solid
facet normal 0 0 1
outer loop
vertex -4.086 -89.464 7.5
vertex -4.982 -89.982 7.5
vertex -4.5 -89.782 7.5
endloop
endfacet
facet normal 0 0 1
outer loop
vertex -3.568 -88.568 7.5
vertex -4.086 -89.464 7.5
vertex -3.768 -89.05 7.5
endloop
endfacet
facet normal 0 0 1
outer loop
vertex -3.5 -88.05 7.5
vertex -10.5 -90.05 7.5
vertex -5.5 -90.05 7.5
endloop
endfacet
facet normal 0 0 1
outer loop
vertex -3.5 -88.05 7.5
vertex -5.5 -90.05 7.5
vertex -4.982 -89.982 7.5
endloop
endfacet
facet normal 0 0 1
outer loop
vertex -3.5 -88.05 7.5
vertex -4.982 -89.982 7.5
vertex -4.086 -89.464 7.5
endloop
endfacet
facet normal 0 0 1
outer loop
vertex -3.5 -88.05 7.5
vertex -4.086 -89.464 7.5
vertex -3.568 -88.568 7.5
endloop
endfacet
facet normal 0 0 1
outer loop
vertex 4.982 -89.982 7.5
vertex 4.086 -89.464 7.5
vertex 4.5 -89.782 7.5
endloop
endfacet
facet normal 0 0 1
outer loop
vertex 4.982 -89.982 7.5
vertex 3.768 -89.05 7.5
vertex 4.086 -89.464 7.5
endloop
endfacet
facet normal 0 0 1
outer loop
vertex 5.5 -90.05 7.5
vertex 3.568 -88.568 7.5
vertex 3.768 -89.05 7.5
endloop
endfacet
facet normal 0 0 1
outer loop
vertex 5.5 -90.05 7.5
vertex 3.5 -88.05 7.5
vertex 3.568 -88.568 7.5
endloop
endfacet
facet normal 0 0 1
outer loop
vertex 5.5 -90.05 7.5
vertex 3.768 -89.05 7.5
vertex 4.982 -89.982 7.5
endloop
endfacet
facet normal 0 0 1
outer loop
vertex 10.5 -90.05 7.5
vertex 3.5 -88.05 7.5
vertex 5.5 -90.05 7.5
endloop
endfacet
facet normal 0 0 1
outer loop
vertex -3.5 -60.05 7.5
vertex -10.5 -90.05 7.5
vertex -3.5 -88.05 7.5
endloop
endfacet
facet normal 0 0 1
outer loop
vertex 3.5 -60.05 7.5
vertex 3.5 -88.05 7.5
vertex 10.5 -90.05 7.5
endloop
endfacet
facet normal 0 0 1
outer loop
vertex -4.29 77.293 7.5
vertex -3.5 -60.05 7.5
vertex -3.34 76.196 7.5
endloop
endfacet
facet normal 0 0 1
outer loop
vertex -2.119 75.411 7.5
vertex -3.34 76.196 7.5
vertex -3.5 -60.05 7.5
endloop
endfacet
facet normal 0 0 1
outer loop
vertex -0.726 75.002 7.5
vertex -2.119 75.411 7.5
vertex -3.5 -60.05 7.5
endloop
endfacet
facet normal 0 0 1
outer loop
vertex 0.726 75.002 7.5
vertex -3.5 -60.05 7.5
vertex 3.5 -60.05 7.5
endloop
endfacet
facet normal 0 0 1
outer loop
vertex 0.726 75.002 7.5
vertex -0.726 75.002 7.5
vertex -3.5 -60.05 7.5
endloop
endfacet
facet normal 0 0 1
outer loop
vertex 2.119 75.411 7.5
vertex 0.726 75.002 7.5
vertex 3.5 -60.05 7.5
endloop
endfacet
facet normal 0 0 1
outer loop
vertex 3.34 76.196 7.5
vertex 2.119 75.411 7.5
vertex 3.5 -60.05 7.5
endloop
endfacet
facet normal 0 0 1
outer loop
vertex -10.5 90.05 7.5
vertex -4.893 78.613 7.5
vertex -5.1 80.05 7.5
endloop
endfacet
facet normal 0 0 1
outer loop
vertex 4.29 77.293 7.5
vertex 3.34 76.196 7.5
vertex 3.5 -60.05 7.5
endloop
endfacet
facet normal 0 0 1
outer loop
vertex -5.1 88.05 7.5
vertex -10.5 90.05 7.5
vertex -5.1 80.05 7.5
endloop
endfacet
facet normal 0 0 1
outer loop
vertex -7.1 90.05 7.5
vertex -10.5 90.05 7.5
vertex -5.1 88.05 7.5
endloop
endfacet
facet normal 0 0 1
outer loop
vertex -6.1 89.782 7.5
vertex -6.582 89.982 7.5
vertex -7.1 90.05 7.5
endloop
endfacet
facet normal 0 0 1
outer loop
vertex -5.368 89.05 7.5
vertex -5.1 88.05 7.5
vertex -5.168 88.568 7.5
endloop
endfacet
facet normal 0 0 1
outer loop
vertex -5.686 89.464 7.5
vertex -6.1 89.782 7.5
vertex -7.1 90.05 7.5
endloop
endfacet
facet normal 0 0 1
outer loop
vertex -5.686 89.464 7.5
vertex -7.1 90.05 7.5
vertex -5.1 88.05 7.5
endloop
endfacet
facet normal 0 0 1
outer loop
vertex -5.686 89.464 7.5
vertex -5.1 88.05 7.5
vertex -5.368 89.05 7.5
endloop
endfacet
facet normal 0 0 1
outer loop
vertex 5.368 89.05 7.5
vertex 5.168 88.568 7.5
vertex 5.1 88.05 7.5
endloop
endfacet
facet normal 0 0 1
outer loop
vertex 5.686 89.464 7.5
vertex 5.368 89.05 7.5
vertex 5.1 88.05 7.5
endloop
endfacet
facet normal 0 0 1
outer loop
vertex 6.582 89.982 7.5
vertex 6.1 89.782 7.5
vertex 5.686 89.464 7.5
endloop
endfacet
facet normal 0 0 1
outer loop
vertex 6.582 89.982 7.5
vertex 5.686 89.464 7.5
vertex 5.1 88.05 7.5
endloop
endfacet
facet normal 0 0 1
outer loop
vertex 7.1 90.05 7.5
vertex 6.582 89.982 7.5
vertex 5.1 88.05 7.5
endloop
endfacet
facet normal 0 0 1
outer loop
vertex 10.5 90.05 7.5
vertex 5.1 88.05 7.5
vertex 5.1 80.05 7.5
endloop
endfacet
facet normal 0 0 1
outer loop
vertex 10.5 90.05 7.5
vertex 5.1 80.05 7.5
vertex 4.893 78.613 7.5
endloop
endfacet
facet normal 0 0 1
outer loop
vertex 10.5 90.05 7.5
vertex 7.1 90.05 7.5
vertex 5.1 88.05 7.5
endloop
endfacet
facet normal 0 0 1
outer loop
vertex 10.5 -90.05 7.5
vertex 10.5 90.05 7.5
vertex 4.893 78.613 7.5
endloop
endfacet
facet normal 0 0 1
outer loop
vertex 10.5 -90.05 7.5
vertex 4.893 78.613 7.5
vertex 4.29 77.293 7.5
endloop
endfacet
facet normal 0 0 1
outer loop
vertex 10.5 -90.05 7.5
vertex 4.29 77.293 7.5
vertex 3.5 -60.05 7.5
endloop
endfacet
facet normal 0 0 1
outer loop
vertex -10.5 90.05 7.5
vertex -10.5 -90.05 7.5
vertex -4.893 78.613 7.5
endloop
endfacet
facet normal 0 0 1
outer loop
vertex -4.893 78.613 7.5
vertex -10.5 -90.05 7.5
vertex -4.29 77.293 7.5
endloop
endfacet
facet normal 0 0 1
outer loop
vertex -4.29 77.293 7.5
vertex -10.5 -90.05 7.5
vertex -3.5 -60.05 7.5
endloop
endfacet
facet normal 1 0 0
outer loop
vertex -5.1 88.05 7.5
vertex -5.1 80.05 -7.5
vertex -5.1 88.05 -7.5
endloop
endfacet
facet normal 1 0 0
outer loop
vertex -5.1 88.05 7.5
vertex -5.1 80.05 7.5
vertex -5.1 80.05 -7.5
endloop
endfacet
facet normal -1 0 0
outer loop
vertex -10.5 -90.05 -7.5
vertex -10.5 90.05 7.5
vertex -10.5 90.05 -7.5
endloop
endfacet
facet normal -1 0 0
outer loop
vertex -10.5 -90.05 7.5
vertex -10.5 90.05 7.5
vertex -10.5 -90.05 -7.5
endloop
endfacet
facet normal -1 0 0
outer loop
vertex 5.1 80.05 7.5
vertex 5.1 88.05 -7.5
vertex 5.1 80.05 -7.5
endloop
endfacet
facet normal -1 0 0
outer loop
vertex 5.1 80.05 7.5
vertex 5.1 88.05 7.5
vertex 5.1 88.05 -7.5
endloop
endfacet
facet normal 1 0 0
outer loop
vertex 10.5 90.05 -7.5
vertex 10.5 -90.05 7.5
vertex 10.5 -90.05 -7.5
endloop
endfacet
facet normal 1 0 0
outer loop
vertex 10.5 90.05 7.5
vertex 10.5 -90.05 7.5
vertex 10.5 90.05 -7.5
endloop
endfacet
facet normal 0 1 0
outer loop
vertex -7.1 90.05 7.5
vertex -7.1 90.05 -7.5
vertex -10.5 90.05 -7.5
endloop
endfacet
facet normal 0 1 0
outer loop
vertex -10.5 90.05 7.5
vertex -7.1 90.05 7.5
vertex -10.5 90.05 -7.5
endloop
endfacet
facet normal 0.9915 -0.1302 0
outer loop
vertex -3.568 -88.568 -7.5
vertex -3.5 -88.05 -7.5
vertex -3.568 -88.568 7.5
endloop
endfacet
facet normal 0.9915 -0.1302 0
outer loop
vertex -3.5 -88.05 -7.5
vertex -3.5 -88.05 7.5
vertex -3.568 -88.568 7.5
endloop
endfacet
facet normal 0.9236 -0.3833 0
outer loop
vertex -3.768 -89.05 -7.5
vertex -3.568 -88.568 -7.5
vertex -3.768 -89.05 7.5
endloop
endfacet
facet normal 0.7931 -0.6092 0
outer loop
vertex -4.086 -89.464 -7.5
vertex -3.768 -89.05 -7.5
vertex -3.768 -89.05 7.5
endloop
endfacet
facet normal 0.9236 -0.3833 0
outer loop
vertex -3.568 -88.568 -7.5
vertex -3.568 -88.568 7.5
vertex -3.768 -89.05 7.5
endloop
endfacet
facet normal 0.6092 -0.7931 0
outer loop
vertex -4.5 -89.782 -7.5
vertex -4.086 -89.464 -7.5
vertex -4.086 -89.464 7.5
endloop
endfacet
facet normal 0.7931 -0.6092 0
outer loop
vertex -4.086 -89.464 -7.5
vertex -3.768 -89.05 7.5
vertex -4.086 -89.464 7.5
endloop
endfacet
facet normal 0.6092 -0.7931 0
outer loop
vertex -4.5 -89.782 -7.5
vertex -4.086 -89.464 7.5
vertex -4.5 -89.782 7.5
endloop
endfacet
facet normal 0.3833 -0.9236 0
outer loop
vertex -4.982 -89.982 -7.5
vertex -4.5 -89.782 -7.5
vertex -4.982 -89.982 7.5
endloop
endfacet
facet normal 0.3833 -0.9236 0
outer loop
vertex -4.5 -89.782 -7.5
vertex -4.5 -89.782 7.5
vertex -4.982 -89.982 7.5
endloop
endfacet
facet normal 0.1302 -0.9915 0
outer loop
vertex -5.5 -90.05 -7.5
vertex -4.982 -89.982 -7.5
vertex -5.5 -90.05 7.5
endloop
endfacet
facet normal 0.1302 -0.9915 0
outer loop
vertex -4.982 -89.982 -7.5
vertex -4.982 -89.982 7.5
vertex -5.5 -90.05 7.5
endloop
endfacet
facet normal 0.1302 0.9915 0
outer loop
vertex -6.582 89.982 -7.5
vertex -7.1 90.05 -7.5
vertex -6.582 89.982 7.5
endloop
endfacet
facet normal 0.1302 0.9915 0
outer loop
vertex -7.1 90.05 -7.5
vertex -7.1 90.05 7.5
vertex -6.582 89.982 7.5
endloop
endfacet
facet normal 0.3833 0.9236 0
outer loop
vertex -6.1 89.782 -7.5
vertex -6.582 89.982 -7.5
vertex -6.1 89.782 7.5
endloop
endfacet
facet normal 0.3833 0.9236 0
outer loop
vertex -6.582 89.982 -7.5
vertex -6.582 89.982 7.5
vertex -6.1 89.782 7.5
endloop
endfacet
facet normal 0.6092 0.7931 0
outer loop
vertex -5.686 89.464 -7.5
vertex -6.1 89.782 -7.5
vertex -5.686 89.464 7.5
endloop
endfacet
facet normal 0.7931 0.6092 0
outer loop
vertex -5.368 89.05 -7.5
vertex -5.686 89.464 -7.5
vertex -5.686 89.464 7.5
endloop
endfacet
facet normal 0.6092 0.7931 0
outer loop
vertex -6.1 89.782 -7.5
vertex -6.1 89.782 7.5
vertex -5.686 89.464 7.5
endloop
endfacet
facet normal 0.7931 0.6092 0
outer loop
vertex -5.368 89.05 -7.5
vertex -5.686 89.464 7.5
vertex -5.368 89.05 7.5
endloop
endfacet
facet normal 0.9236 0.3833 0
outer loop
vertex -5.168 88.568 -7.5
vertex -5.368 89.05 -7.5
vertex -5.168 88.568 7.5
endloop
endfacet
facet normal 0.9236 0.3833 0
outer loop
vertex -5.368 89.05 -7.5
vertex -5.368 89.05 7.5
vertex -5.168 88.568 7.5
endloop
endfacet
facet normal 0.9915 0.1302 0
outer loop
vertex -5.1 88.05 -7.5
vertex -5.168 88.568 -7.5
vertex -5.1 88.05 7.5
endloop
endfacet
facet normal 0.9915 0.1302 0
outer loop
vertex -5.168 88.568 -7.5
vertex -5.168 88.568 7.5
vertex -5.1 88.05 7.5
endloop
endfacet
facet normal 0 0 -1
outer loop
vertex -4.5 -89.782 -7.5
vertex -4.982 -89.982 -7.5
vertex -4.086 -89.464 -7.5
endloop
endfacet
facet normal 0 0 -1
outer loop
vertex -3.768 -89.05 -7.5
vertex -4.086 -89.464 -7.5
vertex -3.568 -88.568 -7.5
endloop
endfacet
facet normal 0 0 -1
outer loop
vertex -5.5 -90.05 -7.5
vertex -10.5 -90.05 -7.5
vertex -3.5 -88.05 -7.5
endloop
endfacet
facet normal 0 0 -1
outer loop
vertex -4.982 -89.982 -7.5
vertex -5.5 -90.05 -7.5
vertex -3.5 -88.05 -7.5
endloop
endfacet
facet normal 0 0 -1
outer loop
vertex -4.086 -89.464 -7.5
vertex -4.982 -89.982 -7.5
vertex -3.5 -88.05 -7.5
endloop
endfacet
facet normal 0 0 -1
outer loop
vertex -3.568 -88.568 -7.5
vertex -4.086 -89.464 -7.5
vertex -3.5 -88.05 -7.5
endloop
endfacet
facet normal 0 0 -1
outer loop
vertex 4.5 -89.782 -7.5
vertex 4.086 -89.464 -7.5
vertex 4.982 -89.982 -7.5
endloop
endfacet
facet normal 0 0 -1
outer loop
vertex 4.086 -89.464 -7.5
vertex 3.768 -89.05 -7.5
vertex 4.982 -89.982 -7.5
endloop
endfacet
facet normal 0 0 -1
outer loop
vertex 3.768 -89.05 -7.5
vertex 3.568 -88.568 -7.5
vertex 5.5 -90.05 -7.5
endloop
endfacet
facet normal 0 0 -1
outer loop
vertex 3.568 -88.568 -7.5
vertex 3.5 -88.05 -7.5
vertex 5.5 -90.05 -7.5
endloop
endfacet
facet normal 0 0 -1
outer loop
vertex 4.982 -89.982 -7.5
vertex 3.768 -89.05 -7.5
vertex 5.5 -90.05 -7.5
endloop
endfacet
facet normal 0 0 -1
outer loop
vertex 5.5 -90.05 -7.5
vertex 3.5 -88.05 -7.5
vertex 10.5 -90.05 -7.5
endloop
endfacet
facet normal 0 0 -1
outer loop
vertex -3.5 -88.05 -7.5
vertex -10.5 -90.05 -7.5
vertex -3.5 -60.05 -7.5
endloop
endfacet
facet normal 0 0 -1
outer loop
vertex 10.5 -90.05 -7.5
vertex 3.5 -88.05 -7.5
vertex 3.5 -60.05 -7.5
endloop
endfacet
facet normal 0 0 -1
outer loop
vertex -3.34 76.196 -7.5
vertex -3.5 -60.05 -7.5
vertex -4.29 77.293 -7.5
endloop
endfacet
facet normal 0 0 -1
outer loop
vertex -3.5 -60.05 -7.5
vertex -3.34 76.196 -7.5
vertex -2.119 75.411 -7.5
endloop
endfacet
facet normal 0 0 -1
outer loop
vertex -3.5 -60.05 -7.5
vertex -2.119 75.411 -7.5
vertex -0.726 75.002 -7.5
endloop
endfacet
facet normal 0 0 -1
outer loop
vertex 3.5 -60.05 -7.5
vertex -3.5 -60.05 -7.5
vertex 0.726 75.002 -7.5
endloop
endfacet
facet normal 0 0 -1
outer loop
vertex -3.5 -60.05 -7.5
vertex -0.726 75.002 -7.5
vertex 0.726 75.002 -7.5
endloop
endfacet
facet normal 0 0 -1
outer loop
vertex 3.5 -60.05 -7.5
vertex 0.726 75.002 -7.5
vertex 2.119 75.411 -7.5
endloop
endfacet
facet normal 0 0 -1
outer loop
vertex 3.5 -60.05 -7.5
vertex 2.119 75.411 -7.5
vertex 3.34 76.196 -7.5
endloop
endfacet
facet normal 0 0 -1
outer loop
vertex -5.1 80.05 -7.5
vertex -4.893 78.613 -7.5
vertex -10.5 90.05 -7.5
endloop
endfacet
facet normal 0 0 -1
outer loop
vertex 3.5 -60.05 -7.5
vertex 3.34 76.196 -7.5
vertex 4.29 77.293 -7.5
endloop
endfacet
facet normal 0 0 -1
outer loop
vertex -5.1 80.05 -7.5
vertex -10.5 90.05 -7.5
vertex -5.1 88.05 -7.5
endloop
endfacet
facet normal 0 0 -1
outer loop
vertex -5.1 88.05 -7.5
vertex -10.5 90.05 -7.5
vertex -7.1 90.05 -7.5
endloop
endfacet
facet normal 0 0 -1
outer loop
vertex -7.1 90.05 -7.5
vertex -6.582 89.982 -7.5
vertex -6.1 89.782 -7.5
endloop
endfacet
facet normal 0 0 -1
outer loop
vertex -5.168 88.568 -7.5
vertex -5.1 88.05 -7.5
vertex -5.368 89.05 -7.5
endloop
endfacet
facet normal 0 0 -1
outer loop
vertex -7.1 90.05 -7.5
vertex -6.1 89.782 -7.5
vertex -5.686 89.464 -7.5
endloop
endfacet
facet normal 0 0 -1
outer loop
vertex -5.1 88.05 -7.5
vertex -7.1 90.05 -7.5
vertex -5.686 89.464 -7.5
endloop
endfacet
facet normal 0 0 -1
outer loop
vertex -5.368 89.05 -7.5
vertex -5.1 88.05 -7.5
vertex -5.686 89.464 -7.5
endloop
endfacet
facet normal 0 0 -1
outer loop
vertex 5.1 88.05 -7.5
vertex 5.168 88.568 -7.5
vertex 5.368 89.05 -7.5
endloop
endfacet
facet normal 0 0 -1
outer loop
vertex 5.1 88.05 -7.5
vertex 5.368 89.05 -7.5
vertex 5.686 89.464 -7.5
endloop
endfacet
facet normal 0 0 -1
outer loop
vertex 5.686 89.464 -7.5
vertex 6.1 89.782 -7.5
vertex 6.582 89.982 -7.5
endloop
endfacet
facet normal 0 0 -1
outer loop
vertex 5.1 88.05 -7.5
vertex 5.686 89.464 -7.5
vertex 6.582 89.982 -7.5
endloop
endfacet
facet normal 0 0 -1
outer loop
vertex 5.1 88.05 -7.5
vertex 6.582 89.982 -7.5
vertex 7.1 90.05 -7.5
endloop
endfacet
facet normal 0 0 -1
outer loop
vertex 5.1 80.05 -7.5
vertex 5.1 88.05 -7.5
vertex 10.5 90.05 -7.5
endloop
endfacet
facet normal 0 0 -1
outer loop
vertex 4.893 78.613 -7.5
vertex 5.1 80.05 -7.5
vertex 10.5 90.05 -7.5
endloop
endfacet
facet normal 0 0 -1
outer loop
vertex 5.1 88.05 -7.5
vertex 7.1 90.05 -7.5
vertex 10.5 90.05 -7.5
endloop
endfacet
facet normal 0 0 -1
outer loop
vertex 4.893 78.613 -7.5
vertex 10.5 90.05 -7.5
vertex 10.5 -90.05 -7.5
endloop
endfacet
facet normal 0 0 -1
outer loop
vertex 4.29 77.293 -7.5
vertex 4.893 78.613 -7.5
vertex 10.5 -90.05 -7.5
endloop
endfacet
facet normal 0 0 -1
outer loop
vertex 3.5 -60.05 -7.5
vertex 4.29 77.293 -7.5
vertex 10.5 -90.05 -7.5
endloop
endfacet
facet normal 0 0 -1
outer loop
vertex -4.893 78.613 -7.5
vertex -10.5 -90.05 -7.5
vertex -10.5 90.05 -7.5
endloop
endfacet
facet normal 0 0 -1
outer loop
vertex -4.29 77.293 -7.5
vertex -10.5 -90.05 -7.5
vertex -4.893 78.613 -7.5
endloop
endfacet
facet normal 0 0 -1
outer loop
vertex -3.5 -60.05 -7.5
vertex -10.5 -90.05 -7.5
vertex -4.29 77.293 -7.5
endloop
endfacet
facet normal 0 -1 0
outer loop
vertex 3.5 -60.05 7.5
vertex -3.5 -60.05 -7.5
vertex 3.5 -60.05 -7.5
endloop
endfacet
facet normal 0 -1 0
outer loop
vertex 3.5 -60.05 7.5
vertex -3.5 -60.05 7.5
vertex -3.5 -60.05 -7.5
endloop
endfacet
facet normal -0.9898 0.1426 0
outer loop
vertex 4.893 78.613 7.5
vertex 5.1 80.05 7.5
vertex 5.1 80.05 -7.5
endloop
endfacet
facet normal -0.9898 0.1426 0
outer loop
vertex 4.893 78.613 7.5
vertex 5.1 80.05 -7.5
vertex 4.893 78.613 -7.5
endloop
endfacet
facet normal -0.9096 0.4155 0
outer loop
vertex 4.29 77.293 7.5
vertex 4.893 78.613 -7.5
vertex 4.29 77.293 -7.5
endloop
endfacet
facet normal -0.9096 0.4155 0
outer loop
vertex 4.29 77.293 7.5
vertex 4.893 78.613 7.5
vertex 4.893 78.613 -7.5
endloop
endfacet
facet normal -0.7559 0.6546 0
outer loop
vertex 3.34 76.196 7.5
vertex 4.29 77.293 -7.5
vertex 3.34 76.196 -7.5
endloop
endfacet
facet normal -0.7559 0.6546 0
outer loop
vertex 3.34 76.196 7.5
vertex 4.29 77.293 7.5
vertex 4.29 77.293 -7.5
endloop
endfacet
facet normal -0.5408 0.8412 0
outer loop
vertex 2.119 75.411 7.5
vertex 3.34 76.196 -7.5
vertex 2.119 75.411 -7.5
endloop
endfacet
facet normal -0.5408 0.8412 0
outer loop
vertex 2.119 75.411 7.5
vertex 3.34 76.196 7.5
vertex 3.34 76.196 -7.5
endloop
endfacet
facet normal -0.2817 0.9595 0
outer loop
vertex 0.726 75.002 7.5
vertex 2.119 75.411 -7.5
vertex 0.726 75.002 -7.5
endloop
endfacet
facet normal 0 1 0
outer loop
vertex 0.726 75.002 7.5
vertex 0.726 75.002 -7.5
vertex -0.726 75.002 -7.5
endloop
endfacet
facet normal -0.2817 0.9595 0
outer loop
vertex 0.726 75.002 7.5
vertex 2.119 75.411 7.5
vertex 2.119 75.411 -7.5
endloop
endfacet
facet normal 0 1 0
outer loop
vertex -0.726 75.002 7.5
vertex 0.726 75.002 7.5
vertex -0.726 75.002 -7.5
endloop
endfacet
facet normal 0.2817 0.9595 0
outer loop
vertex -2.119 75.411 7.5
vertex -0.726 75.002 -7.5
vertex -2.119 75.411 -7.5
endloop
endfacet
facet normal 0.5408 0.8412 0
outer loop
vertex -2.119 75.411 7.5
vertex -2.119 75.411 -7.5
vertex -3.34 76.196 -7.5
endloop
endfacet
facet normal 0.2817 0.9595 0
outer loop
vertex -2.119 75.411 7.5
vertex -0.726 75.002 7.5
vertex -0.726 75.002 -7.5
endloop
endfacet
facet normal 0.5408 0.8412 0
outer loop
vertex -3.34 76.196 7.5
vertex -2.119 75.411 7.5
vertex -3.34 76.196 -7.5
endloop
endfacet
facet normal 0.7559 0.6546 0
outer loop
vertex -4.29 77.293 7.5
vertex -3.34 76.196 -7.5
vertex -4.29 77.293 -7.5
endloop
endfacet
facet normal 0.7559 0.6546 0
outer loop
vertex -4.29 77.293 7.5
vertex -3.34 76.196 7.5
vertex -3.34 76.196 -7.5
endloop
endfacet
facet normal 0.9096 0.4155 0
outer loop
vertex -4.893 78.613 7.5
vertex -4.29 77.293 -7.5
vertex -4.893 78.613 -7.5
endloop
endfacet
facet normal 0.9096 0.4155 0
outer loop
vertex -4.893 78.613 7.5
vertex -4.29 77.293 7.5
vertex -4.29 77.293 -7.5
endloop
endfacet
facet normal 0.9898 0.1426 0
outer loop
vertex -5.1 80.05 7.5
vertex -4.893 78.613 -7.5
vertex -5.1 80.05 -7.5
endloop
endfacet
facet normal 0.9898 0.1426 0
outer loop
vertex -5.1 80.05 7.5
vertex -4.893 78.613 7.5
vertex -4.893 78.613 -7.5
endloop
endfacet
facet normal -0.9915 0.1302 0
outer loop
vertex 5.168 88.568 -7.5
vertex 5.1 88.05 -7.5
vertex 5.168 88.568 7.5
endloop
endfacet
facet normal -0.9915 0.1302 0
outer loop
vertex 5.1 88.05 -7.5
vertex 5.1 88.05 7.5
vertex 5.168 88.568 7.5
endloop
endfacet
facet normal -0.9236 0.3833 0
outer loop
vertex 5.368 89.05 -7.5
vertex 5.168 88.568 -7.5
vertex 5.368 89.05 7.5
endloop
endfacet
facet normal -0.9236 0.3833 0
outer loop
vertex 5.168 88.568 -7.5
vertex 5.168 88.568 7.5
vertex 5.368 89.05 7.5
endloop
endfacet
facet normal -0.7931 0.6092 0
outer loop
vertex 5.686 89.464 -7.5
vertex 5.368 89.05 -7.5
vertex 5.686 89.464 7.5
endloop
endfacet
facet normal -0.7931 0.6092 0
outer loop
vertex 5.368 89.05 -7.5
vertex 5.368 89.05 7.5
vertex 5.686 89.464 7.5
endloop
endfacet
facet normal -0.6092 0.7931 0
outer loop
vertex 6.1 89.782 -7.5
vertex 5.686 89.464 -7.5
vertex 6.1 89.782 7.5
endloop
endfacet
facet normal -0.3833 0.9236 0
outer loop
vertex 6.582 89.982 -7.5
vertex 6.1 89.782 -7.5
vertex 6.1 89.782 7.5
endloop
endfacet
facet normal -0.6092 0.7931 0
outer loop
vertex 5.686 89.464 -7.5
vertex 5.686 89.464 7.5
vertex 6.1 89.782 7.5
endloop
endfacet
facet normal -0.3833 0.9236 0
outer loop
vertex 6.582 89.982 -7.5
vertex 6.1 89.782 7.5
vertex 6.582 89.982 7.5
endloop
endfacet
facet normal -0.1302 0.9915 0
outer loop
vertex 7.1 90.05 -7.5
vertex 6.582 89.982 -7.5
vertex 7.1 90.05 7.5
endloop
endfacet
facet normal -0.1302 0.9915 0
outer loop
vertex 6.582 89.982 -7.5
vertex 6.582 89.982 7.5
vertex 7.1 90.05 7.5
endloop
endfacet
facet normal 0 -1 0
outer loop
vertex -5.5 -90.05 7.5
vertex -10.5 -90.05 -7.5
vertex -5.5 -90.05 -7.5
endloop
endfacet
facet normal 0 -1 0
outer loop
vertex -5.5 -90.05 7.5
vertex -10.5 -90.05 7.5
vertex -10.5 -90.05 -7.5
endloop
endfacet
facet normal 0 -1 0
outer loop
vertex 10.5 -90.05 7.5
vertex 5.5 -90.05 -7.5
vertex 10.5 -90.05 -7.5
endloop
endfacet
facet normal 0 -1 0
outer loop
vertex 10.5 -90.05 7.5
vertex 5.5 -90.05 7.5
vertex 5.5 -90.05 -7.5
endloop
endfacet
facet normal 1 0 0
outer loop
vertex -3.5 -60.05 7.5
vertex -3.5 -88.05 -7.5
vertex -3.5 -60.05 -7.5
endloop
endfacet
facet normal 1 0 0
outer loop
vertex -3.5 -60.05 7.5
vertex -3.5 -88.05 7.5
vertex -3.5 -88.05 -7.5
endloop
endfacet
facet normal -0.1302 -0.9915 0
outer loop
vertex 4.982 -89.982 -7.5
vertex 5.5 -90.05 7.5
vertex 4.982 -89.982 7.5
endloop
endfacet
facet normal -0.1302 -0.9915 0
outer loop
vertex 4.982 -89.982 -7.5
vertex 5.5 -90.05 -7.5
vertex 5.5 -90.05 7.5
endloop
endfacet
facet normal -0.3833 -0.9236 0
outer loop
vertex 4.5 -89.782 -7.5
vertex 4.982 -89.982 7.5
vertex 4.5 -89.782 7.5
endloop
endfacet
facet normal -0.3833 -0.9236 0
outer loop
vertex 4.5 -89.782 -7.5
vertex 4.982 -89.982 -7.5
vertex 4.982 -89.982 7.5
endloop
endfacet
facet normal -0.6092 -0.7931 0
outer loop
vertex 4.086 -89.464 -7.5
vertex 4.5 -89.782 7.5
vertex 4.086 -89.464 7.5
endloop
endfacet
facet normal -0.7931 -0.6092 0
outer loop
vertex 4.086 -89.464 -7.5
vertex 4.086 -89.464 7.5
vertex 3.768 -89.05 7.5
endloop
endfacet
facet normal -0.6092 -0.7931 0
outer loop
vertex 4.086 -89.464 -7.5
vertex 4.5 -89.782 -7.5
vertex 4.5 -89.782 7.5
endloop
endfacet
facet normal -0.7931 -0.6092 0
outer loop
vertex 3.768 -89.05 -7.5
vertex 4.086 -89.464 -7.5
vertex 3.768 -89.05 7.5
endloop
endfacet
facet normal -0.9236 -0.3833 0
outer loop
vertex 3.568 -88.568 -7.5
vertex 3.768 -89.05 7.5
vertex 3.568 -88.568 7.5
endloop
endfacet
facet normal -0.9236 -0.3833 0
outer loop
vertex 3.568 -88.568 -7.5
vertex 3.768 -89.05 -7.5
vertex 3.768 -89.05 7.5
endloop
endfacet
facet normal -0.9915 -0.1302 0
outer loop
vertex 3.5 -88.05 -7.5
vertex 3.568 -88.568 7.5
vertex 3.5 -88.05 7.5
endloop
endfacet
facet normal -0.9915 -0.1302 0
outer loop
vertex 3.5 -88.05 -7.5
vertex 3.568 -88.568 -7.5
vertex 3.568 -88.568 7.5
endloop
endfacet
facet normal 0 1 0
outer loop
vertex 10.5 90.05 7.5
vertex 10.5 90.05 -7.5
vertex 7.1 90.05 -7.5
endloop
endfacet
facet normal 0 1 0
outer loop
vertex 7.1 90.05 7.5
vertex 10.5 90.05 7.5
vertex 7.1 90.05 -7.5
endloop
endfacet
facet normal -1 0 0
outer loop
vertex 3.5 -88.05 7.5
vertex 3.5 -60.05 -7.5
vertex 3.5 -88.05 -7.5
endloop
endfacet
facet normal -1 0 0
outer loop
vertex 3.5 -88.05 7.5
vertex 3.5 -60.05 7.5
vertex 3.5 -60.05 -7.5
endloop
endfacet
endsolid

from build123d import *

# Parameters (mm, degrees)
F1_DEPTH = 7.5
F2_R     = 2


with BuildPart() as f1:
    # F0 (on Top) → F1 (new body, symmetric)
    with BuildSketch(Plane.XY):
        with BuildLine():
            Line((3.5, -90.05), (10.5, -90.05))
            Line((10.5, -90.05), (10.5, 90.05))
            Line((10.5, 90.05), (5.1, 90.05))
            Line((5.1, 90.05), (5.1, 80.05))
            ThreePointArc((5.1, 80.05), (0, 74.95), (-5.1, 80.05))
            Line((-5.1, 80.05), (-5.1, 90.05))
            Line((-5.1, 90.05), (-10.5, 90.05))
            Line((-10.5, 90.05), (-10.5, -90.05))
            Line((-10.5, -90.05), (-3.5, -90.05))
            Line((-3.5, -90.05), (-3.5, -60.05))
            Line((-3.5, -60.05), (3.5, -60.05))
            Line((3.5, -60.05), (3.5, -90.05))
        make_face()
    extrude(amount=F1_DEPTH, both=True)

    # F2
    f2_edges = [f1.edges().sort_by_distance(p)[0] for p in [
        (5.1, 90.05, 0),
        (-5.1, 90.05, 0),
        (-3.5, -90.05, 0),
        (3.5, -90.05, 0),
    ]]
    fillet(f2_edges, radius=F2_R)


solid = f1.part
